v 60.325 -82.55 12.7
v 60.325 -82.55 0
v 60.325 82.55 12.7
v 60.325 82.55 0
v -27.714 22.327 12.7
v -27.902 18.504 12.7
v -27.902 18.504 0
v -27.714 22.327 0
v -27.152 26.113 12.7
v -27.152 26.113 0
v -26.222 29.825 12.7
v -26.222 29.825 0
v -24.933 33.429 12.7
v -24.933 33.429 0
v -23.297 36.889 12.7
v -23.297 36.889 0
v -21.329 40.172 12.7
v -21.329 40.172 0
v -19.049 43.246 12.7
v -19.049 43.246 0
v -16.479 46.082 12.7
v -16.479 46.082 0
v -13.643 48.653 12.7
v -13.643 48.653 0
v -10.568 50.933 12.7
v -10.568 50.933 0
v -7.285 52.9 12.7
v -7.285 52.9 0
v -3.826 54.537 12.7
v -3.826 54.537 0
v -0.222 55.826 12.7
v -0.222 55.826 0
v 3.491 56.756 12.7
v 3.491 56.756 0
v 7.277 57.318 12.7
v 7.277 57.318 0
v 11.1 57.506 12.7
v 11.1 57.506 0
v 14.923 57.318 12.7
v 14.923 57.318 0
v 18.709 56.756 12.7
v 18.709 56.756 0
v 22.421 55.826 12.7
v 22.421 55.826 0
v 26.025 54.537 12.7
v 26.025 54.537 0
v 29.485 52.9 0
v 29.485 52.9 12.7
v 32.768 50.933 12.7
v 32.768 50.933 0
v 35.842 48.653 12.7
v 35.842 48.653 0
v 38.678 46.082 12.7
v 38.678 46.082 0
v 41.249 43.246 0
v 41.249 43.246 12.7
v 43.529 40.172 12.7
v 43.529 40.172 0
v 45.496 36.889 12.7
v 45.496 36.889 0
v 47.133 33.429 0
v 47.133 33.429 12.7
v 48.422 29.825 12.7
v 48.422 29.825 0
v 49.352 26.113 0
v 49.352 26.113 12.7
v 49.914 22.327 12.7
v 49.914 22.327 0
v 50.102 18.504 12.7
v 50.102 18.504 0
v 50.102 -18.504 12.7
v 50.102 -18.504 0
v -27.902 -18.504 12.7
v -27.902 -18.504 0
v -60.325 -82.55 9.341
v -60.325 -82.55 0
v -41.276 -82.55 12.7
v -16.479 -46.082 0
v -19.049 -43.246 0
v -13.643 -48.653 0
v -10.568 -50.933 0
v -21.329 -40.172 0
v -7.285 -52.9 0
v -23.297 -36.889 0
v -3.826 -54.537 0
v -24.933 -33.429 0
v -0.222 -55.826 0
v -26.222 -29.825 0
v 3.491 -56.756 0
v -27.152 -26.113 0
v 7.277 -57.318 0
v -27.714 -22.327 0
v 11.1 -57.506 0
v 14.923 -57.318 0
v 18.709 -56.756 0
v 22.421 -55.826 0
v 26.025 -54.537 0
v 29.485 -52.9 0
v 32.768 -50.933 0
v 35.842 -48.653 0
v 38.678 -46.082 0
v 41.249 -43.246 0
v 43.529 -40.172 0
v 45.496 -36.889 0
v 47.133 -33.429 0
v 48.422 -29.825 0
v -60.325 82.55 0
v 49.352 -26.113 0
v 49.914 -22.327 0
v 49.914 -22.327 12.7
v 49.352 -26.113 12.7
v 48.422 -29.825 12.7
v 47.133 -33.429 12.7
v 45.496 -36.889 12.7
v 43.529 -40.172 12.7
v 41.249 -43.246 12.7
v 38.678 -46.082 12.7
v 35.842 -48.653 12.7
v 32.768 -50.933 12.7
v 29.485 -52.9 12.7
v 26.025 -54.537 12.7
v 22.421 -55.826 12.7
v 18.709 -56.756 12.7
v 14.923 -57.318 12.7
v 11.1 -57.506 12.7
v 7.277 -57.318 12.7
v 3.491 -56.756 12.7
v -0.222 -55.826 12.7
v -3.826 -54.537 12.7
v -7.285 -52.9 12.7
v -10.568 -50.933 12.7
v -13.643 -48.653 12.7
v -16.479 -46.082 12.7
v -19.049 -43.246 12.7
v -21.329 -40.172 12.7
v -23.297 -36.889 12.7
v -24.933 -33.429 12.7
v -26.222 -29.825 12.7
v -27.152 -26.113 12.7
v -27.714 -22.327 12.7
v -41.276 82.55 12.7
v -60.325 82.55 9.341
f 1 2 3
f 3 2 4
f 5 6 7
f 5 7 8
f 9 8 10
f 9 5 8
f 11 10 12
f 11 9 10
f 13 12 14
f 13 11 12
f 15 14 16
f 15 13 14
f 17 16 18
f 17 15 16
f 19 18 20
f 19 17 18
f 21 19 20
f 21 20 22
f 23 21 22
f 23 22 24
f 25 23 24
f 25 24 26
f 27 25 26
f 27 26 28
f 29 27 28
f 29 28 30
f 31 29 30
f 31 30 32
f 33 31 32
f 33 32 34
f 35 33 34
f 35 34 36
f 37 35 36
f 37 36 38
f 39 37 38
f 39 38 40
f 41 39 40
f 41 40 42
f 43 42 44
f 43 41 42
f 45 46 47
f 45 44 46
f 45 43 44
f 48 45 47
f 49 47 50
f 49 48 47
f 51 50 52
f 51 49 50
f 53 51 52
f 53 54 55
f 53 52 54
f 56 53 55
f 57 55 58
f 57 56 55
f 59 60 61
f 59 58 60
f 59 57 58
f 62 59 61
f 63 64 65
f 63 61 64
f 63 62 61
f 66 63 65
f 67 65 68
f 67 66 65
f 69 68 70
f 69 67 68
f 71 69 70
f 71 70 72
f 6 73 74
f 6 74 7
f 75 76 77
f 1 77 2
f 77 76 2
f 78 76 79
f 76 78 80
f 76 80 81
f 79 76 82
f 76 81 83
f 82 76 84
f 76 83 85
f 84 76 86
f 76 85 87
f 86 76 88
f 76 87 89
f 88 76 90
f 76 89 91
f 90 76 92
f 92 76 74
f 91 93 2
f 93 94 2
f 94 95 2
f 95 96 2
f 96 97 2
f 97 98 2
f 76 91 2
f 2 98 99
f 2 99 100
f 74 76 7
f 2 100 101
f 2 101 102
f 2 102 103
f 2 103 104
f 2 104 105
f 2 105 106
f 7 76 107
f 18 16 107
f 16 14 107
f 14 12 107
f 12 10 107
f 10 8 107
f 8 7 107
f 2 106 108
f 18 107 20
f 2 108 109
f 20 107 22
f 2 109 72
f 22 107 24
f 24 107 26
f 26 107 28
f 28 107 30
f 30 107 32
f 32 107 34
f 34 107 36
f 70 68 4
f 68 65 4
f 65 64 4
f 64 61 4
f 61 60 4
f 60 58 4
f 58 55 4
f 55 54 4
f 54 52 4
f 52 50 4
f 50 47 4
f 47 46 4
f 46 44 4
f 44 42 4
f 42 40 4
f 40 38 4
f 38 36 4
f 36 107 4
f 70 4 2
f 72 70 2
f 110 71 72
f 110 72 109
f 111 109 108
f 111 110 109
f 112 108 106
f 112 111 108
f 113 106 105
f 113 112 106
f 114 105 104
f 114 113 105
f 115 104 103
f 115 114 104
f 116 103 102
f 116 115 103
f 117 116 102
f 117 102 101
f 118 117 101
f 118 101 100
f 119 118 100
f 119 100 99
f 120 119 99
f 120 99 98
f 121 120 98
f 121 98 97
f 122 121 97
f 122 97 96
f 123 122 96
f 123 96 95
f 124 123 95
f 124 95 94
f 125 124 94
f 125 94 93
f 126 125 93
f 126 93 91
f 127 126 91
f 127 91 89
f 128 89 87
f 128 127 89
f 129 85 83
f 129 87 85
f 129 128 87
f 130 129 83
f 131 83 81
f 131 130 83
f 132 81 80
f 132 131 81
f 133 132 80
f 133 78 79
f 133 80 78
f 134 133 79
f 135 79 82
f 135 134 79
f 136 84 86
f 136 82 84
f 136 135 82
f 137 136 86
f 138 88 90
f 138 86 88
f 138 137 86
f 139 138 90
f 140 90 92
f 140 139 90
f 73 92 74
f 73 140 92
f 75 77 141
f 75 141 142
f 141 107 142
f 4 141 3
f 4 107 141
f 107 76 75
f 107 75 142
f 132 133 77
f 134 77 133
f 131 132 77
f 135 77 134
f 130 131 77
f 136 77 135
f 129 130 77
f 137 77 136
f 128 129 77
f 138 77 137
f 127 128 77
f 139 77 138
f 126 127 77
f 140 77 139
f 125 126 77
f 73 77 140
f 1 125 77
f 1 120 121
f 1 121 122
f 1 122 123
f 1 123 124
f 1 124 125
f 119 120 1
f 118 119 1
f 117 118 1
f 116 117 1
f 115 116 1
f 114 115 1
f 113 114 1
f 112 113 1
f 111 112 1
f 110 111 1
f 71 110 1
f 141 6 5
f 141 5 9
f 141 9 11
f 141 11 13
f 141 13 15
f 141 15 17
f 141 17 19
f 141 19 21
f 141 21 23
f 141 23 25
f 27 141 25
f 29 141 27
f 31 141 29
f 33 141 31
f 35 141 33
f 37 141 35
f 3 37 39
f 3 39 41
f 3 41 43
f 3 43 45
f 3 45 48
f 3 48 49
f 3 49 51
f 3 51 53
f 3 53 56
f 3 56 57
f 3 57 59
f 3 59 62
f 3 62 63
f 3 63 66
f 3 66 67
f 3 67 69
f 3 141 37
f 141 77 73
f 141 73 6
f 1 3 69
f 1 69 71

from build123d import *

# Parameters (mm, degrees)
SKETCH1_W           = 120.65
SKETCH1_H           = 165.1
BOSS_EXTRUDE1_DEPTH = 12.7
CUT_EXTRUDE1_REACH  = 105.029
CUT_EXTRUDE2_REACH  = 178.234


with BuildPart() as part:
    # Sketch1 → Boss-Extrude1 (new body)
    with BuildSketch(Plane.XY):
        Rectangle(SKETCH1_W, SKETCH1_H)
    extrude(amount=BOSS_EXTRUDE1_DEPTH)

    # Sketch2 → Cut-Extrude1 (cut, up to next)
    with BuildSketch(Plane.XY.offset(12.7), mode=Mode.PRIVATE) as cut_extrude1_sk1:
        with BuildLine():
            Line((50.1015, 18.5039), (50.1015, -18.5039))
            ThreePointArc((50.1015, -18.5039), (11.0998, -57.5056), (-27.9019, -18.5039))
            Line((-27.9019, -18.5039), (-27.9019, 18.5039))
            ThreePointArc((-27.9019, 18.5039), (11.0998, 57.5056), (50.1015, 18.5039))
        make_face()
    cut_extrude1_tool1 = extrude(cut_extrude1_sk1.sketch, amount=-CUT_EXTRUDE1_REACH, mode=Mode.PRIVATE) & part.part
    add(cut_extrude1_tool1.solids().sort_by_distance((11.0998, 0, 12.7))[0], mode=Mode.SUBTRACT)

    # Sketch3 → Cut-Extrude2 (cut, up to next)
    with BuildSketch(Plane(origin=(0, 82.55, 0), x_dir=(1, 0, 0), z_dir=(0, 1, 0)), mode=Mode.PRIVATE) as cut_extrude2_sk1:
        Polygon((-41.276197421, -12.7), (-60.325, -9.341182155), (-60.325, -12.7), align=None)
    cut_extrude2_tool1 = extrude(cut_extrude2_sk1.sketch, amount=-CUT_EXTRUDE2_REACH, mode=Mode.PRIVATE) & part.part
    add(cut_extrude2_tool1.solids().sort_by_distance((-53.975399, 82.55, 11.580394))[0], mode=Mode.SUBTRACT)


solid = part.part
